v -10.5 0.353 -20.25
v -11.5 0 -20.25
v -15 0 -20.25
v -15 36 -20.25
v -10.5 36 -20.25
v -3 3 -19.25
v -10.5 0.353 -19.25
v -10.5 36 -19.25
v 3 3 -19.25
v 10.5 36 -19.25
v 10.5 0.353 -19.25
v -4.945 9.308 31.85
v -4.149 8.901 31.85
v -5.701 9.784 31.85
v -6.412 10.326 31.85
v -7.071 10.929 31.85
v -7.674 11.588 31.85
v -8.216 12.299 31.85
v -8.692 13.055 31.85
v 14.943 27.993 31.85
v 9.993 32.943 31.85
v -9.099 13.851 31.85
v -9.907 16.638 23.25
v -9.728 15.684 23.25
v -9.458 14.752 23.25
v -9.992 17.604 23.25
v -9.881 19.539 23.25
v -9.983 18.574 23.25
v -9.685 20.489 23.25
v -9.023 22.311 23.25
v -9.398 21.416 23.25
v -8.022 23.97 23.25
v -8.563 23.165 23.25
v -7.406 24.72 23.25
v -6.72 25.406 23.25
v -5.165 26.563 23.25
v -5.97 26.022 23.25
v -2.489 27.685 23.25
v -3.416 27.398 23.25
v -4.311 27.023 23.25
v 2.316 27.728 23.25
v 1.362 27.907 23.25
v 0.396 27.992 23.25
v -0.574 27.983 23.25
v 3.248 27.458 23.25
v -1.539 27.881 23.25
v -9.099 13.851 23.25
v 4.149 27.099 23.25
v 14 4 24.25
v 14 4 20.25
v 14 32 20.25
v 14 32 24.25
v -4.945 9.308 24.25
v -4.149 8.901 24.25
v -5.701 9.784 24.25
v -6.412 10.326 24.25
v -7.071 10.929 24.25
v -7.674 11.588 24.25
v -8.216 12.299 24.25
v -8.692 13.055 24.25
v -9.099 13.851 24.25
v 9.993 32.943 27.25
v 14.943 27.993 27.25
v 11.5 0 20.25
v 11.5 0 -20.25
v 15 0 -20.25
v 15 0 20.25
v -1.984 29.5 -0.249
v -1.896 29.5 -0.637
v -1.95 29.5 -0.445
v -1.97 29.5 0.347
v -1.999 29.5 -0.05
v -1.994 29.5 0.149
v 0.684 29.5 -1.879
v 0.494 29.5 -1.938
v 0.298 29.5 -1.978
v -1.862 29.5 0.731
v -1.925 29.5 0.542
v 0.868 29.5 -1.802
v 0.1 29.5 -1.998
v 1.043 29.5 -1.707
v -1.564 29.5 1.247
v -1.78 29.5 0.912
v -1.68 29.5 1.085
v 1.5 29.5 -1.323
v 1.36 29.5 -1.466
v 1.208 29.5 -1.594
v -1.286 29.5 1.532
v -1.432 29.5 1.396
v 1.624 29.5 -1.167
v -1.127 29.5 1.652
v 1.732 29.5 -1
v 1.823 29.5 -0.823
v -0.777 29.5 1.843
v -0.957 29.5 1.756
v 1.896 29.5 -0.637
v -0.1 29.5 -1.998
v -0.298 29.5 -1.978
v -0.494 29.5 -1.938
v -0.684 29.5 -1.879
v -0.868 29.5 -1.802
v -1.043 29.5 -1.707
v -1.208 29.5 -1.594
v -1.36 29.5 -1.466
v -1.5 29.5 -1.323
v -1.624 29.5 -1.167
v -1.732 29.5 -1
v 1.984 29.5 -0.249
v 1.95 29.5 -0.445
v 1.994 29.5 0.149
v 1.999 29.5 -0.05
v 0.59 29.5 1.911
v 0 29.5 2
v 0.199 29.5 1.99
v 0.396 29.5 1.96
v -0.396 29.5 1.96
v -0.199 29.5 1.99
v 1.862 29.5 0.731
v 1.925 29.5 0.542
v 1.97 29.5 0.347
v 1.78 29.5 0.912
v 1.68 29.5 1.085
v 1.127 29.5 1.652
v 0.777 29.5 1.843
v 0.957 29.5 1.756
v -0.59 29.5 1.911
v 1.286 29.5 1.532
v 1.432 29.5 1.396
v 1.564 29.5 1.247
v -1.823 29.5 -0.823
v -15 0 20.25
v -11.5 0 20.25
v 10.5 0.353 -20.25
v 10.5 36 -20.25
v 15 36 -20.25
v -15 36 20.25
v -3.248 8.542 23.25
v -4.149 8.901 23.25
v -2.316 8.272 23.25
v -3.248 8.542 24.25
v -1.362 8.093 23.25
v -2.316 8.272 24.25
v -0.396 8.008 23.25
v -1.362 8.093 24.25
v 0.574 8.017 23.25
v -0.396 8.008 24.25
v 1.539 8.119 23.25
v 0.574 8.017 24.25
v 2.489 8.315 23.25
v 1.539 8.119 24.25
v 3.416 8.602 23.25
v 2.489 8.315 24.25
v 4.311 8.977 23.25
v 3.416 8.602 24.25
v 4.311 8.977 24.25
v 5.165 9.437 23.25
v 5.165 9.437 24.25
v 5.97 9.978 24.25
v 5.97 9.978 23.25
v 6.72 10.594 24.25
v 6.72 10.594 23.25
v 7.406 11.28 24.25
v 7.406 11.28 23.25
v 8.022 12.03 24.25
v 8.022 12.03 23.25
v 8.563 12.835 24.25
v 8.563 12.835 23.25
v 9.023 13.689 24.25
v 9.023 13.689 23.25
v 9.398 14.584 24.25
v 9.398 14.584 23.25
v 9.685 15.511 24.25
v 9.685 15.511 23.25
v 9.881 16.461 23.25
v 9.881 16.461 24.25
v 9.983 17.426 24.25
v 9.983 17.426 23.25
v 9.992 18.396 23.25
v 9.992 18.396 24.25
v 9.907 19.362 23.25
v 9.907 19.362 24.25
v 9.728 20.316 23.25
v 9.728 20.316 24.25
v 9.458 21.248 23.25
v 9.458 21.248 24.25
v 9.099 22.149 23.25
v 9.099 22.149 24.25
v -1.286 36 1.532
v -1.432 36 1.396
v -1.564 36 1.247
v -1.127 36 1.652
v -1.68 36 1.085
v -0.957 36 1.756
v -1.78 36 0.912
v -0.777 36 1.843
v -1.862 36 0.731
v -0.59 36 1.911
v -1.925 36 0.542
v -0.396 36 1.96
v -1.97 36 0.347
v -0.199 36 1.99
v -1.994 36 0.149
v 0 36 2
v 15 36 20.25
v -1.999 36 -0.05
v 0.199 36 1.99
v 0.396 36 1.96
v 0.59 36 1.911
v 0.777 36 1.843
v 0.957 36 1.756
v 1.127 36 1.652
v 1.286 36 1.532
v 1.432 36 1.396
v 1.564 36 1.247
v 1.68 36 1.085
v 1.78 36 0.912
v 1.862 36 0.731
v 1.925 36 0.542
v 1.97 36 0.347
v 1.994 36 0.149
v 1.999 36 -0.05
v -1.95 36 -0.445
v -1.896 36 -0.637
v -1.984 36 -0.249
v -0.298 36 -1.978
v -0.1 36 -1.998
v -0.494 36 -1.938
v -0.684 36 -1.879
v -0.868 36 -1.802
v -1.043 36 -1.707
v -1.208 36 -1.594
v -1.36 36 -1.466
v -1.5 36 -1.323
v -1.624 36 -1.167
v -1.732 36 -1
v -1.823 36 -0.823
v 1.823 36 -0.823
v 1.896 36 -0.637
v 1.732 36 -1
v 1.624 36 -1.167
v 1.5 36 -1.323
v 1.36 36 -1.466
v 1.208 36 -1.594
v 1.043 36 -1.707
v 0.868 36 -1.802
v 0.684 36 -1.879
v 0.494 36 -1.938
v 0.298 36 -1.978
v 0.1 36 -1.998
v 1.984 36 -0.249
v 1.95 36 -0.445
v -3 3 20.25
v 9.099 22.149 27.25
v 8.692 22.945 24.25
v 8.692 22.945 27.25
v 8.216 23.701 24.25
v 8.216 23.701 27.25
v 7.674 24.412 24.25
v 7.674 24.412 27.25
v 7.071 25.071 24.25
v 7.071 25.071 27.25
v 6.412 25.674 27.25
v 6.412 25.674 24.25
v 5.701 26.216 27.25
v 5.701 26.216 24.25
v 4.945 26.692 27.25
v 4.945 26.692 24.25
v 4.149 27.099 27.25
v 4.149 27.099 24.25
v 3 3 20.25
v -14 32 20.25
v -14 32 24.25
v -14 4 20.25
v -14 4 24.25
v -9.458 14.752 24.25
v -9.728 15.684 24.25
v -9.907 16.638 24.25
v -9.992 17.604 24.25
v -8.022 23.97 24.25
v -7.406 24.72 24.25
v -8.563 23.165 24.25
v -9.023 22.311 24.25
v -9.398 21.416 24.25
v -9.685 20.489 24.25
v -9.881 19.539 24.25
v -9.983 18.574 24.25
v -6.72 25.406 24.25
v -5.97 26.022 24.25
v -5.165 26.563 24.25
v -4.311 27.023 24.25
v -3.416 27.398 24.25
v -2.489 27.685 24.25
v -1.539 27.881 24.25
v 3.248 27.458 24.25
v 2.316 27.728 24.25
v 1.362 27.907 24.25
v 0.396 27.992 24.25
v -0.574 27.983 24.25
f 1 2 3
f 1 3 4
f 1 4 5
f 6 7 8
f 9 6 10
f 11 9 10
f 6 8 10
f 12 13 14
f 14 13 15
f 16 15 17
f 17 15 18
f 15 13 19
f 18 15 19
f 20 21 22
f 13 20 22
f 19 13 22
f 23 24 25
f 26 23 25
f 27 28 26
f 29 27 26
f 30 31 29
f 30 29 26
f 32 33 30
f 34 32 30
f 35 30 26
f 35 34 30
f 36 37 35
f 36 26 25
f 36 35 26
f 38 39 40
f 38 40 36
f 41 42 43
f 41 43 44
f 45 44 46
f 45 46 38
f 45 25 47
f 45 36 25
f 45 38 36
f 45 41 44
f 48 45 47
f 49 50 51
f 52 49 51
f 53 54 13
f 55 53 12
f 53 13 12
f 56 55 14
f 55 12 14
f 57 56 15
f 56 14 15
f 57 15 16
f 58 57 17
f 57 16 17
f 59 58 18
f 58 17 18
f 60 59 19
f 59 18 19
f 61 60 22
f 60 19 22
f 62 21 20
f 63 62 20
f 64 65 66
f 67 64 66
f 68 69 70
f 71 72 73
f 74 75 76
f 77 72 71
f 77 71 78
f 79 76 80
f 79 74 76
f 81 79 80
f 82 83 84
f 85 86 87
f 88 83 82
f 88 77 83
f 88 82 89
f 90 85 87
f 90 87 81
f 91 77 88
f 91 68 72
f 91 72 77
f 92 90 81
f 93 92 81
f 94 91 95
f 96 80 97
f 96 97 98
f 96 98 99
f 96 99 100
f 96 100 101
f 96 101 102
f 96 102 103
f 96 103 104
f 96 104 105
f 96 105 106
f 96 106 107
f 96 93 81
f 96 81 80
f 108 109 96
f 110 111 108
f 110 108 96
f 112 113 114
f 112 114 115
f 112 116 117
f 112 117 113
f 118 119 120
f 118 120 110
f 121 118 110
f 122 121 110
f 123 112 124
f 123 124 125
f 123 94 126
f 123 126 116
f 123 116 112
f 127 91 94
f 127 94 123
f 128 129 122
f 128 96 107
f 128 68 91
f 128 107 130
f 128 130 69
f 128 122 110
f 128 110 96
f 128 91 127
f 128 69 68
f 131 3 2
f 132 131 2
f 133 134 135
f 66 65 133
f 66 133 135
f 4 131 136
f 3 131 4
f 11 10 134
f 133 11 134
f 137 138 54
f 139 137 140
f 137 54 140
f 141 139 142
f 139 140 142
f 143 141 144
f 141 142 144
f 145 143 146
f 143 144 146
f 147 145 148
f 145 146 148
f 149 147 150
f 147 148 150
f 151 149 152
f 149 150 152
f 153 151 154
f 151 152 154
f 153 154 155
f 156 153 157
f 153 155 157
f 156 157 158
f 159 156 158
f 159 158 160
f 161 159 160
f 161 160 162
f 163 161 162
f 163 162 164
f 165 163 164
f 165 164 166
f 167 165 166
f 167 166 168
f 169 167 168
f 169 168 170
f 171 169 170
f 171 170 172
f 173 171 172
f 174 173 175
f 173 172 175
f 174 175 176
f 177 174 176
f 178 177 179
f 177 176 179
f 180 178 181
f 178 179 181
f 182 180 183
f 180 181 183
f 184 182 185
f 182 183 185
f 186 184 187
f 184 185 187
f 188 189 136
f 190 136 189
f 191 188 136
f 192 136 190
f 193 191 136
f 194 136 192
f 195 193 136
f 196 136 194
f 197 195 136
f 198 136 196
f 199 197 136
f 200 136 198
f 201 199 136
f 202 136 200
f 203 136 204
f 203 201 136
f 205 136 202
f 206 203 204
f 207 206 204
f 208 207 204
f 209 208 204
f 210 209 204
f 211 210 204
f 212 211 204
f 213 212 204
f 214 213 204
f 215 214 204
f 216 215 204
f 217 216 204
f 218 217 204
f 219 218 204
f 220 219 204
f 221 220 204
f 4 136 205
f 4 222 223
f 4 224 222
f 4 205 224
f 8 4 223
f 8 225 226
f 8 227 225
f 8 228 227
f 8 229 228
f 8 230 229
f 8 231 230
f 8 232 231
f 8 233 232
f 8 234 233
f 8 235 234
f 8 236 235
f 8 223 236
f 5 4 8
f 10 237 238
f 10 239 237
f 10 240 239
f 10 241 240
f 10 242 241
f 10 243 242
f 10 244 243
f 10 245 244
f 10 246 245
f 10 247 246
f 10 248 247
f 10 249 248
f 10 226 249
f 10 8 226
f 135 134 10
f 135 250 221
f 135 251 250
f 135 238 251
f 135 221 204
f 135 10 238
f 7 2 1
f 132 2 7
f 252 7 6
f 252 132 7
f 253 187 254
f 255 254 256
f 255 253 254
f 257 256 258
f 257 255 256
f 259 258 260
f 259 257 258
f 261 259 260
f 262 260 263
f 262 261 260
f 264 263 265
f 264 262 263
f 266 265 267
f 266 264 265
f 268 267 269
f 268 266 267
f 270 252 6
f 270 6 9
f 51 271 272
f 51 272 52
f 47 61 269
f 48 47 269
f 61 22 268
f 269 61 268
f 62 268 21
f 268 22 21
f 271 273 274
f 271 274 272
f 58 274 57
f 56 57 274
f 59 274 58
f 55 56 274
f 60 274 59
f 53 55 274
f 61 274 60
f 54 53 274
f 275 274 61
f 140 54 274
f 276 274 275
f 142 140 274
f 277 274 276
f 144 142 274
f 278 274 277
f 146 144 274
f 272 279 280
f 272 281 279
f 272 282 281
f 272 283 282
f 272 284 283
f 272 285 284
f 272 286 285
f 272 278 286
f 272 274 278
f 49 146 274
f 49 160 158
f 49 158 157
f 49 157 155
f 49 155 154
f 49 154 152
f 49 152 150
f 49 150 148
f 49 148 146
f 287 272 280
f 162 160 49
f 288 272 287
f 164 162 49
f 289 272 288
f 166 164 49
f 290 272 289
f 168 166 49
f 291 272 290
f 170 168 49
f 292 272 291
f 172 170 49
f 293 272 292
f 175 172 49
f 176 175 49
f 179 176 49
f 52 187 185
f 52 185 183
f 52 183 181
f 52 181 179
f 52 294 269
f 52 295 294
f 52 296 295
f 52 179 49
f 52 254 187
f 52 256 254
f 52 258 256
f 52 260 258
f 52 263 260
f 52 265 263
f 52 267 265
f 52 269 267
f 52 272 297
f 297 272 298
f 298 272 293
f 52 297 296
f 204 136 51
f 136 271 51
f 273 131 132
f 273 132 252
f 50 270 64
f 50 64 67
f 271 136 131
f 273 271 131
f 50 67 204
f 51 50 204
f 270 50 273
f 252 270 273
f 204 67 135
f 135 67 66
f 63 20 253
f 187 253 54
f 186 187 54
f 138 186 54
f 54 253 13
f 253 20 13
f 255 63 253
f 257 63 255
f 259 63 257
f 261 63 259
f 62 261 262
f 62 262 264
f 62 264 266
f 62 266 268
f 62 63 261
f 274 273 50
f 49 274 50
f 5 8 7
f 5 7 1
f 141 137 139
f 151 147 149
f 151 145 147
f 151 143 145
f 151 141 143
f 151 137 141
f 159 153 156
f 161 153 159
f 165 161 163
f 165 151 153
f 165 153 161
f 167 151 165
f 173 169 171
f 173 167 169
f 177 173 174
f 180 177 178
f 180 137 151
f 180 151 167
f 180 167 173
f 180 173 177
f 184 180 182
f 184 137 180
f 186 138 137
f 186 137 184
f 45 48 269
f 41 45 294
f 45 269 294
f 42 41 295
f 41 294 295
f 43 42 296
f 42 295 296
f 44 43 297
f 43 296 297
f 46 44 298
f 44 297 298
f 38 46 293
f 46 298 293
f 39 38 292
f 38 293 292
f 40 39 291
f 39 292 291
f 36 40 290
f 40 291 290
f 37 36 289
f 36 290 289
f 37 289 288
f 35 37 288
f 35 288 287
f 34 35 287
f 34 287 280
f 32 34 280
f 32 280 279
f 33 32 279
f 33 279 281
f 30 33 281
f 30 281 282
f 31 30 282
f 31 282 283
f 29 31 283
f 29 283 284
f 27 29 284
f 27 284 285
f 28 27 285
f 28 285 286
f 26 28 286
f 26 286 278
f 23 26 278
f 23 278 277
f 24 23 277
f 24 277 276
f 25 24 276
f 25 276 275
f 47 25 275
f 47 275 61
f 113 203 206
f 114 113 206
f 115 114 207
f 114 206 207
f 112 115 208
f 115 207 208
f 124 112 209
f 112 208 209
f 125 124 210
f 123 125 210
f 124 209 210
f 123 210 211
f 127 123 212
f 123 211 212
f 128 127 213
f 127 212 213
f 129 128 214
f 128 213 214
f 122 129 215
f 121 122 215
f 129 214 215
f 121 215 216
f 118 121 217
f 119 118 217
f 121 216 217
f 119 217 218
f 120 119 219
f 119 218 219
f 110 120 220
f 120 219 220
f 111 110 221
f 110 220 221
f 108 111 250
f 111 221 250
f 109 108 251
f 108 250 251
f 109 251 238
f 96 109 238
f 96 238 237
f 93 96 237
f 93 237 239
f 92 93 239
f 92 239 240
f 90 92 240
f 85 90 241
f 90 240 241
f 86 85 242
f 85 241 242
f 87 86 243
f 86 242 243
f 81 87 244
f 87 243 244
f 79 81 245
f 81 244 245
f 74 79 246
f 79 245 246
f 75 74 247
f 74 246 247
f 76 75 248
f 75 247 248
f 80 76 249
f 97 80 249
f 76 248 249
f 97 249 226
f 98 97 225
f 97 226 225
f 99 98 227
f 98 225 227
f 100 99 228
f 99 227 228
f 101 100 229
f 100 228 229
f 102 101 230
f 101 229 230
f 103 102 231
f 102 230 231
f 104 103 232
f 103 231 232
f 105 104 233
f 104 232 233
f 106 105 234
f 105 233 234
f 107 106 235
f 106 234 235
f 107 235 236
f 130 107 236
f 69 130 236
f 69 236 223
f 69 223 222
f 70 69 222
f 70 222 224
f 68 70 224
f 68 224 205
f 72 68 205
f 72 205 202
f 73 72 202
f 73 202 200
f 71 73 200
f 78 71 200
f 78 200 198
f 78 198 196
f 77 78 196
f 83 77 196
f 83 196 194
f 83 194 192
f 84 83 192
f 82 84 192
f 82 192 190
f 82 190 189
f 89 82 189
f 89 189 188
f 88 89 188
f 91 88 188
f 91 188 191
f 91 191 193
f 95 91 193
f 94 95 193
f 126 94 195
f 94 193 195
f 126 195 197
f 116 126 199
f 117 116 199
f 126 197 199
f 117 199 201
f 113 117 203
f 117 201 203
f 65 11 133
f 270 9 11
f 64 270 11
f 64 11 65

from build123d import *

# Parameters (mm, degrees)
SKETCH_1_W          = 30
SKETCH_1_H          = 40.5
EXTRUDE_1_DEPTH     = 36
SKETCH_2_W          = 28
SKETCH_2_H          = 28
EXTRUDE_2_DEPTH     = 4
SKETCH_3_R          = 10
CUT_EXTRUDE_1_DEPTH = 1
EXTRUDE_START       = 4
EXTRUDE_3_DEPTH     = 4
EXTRUDE_START_2     = 4.6
EXTRUDE_4_DEPTH     = 4.6
SKETCH_7_W          = 21
SKETCH_7_H          = 1
CUT_EXTRUDE_2_DEPTH = 51.352979058
CUT_EXTRUDE_3_DEPTH = 57.224994442
SKETCH_9_R          = 2
CUT_EXTRUDE_4_DEPTH = 6.5


with BuildPart() as part:
    # 草图1 → 凸台-拉伸1 (new body)
    with BuildSketch(Plane(origin=(0, 0, 0), x_dir=(1, 0, 0), z_dir=(0, 1, 0))):
        Rectangle(SKETCH_1_W, SKETCH_1_H)
    extrude(amount=EXTRUDE_1_DEPTH)

    # 草图2 → 凸台-拉伸2 (add)
    with BuildSketch(Plane.XY.offset(20.25)):
        with Locations((0, 18)):
            Rectangle(SKETCH_2_W, SKETCH_2_H)
    extrude(amount=EXTRUDE_2_DEPTH)

    # 草图3 → 切除-拉伸1 (cut)
    with BuildSketch(Plane.XY.offset(24.25)):
        with Locations((0, 18)):
            Circle(SKETCH_3_R)
    extrude(amount=-CUT_EXTRUDE_1_DEPTH, mode=Mode.SUBTRACT)

    # 草图5 → 凸台-拉伸3 (add)
    with BuildSketch(Plane.XY.offset(23.25).offset(EXTRUDE_START)):
        with BuildLine():
            Line((4.148946916, 27.098694384), (-9.098694384, 13.851053084))
            ThreePointArc((-9.098694384, 13.851053084), (-7.071067812, 10.928932188), (-4.148946916, 8.901305616))
            Line((-4.148946916, 8.901305616), (9.098694384, 22.148946916))
            ThreePointArc((9.098694384, 22.148946916), (7.071067812, 25.071067812), (4.148946916, 27.098694384))
        make_face()
    extrude(amount=-EXTRUDE_3_DEPTH)

    # 草图6 → 凸台-拉伸4 (add)
    with BuildSketch(Plane.XY.offset(27.25).offset(EXTRUDE_START_2)):
        with BuildLine():
            Line((-9.098694384, 13.851053084), (9.993188708, 32.942936176))
            Line((9.993188708, 32.942936176), (14.942936176, 27.993188708))
            Line((14.942936176, 27.993188708), (-4.148946916, 8.901305616))
            ThreePointArc((-4.148946916, 8.901305616), (-7.071067812, 10.928932188), (-9.098694384, 13.851053084))
        make_face()
    extrude(amount=-EXTRUDE_4_DEPTH)

    # 草图7 → 切除-拉伸2 (cut, through all)
    with BuildSketch(Plane(origin=(0, 36, 0), x_dir=(1, 0, 0), z_dir=(0, 1, 0))):
        with Locations((0, 19.75)):
            Rectangle(SKETCH_7_W, SKETCH_7_H)
    extrude(amount=-CUT_EXTRUDE_2_DEPTH, mode=Mode.SUBTRACT)

    # 草图8 → 切除-拉伸3 (cut, through all)
    with BuildSketch(Plane.XY.offset(20.25)):
        Polygon((-11.5, 0), (-3, 3), (3, 3), (11.5, 0), align=None)
    extrude(amount=-CUT_EXTRUDE_3_DEPTH, mode=Mode.SUBTRACT)

    # 草图9 → 切除-拉伸4 (cut)
    with BuildSketch(Plane(origin=(0, 36, 0), x_dir=(1, 0, 0), z_dir=(0, 1, 0))):
        with Locations(Location((0, 0, 0), (0, 0, 270))):
            Circle(SKETCH_9_R)
    extrude(amount=-CUT_EXTRUDE_4_DEPTH, mode=Mode.SUBTRACT)


solid = part.part
